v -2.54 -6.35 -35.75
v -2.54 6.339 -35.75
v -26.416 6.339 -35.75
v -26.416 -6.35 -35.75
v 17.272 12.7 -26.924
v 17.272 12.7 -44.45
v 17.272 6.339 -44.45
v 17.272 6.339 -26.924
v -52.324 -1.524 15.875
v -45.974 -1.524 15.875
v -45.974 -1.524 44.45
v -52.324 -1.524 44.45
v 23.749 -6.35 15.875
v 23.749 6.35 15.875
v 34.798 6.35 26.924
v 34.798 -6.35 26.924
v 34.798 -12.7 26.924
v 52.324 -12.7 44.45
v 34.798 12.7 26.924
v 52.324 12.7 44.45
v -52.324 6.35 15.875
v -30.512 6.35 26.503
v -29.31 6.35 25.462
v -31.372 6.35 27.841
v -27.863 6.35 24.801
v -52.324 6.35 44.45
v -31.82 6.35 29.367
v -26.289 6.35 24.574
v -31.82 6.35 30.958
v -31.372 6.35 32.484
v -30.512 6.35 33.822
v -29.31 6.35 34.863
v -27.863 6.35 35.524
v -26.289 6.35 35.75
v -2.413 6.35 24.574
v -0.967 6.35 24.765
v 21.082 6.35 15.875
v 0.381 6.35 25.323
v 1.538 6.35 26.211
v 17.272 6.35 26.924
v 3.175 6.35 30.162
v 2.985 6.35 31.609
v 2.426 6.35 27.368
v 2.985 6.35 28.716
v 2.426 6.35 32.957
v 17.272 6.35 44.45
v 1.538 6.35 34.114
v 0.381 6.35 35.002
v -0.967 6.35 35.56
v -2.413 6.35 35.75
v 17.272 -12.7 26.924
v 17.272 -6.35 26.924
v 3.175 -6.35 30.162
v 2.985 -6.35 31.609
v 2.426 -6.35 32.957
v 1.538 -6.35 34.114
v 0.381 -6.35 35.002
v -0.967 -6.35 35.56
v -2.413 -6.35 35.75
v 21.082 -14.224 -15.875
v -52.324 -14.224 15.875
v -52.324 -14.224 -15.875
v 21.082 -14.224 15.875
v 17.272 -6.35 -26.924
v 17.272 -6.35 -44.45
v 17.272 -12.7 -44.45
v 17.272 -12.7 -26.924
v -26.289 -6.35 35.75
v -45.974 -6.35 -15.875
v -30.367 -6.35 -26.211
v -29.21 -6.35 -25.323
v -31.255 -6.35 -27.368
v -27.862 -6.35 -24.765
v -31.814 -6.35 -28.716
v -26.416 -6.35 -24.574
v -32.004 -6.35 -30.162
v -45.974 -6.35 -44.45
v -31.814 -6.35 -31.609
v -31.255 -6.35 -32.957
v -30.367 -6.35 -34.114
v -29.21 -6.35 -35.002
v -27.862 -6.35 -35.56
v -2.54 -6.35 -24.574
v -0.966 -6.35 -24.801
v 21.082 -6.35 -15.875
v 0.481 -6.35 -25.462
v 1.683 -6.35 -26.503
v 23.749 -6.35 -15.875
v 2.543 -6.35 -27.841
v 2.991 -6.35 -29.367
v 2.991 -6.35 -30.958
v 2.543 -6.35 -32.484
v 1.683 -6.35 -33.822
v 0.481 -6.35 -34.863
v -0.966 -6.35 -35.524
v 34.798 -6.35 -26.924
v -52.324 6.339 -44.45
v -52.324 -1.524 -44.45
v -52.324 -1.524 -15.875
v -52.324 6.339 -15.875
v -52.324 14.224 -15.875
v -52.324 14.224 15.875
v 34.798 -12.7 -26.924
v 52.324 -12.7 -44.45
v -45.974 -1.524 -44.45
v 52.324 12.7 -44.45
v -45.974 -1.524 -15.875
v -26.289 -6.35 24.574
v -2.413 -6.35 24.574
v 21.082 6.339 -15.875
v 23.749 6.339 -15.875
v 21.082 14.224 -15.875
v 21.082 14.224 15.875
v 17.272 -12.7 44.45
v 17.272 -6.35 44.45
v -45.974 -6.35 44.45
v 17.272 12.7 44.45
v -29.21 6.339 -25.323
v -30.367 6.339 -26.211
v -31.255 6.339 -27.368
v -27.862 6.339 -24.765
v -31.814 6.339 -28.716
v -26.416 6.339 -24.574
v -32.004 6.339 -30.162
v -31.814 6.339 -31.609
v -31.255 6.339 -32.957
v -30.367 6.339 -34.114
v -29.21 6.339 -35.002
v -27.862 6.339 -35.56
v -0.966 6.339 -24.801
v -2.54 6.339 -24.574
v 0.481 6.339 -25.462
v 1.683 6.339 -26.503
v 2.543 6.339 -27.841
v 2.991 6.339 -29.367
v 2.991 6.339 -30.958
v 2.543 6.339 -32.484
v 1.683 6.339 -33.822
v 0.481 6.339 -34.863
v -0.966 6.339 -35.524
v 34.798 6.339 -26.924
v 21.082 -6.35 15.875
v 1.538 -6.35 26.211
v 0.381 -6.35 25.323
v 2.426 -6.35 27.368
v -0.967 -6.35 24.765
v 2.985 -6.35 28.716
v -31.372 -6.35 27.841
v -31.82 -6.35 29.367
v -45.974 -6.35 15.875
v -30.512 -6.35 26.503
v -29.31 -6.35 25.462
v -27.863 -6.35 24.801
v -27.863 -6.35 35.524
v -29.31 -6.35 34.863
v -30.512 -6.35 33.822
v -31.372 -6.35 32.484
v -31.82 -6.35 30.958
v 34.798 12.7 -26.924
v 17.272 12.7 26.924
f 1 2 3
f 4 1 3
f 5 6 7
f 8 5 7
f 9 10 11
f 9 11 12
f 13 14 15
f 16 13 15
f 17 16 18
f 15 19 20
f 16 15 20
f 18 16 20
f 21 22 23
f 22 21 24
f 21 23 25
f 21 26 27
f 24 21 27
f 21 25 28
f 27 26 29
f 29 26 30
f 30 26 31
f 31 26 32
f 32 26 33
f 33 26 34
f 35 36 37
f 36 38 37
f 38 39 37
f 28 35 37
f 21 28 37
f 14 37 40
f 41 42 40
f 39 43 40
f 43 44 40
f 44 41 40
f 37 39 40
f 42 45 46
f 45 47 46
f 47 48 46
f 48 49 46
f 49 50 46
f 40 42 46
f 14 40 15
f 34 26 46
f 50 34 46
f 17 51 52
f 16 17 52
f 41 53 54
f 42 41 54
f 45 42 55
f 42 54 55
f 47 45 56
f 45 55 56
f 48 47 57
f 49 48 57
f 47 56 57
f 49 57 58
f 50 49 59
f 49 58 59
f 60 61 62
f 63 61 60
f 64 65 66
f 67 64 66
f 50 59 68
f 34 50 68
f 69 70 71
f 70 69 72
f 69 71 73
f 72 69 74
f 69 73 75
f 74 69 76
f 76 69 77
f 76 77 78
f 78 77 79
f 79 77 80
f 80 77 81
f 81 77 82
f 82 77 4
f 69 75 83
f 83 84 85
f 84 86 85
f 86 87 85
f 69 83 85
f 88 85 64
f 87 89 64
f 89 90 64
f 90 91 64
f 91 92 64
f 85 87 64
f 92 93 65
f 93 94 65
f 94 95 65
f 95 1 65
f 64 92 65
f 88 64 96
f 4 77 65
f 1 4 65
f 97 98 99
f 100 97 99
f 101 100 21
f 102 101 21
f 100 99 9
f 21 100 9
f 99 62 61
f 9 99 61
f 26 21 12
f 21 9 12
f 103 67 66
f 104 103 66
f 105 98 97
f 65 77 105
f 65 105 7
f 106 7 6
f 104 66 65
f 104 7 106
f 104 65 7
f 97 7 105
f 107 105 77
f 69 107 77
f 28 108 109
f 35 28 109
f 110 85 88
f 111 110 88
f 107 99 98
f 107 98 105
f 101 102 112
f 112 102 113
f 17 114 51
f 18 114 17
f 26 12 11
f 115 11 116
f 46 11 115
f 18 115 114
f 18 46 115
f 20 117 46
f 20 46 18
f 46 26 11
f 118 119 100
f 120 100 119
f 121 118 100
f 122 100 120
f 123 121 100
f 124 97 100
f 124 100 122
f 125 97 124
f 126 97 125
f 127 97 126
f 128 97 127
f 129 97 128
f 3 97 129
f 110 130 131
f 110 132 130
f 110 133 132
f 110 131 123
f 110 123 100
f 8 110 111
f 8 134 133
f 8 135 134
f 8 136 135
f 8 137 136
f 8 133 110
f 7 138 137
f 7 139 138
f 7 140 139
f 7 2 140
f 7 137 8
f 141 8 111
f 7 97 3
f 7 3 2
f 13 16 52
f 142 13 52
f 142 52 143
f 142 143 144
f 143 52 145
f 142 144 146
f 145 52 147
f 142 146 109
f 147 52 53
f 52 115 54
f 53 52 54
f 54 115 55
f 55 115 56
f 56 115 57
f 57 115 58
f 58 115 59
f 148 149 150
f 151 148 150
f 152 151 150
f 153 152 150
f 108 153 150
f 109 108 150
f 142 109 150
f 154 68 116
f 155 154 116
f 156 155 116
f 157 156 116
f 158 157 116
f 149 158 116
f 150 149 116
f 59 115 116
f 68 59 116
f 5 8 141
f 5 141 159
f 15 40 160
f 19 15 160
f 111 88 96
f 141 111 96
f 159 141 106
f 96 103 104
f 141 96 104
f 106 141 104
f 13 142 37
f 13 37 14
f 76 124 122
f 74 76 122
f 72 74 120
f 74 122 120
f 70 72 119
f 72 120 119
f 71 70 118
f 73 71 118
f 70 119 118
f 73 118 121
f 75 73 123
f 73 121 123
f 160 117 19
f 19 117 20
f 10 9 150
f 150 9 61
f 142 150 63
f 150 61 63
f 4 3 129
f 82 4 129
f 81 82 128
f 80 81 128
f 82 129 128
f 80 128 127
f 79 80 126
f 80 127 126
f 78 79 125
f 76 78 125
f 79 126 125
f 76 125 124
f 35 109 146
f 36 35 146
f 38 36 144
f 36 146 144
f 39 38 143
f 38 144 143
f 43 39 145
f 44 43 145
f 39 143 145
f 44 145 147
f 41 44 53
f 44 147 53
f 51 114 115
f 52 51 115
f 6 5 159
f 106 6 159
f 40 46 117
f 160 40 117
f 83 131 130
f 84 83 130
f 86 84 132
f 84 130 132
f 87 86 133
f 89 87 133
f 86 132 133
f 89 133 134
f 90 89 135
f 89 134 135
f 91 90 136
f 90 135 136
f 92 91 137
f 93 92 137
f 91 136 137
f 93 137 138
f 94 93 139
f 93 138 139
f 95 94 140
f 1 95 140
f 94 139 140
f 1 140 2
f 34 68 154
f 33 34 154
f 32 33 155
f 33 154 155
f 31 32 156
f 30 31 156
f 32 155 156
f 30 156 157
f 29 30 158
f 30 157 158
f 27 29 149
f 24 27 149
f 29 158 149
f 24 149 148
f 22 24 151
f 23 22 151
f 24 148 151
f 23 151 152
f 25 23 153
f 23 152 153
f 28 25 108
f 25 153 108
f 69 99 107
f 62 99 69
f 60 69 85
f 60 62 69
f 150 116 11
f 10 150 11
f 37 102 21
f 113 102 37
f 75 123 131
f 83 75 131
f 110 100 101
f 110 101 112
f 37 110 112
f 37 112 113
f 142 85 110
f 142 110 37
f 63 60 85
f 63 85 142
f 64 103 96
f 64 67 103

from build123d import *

# Parameters (mm, degrees)
F0_W      = 104.648
F0_H      = 31.75
F1_DEPTH  = 14.224
F0_H_2    = 28.575
F2_DEPTH  = 12.7
F4_W      = 69.596
F4_H      = 6.3613896862
F5_DEPTH  = 28.575
F3_W      = 69.596
F3_H      = 6.35
F6_DEPTH  = 28.575
F7_W      = 6.35
F7_H      = 11.049
F7_W_2    = 6.3613896862
F8_DEPTH  = 52.325
F9_W      = 31.242
F9_H      = 31.75
F10_DEPTH = 28.449
F12_DEPTH = 20.575
F14_DEPTH = 26.925
F16_DEPTH = 26.925
F18_DEPTH = 20.575
F21_DEPTH = 20.575
F22_DEPTH = 20.5636103138


with BuildPart() as f1:
    # F0 (on Front) → F1 (new body, symmetric)
    with BuildSketch(Plane.XZ):
        Rectangle(F0_W, F0_H)
    extrude(amount=F1_DEPTH, both=True)

    # F0 (on Front) → F2 (join, symmetric)
    with BuildSketch(Plane.XZ):
        with Locations((0, 30.1625)):
            Rectangle(F0_W, F0_H_2)
        with Locations((0, -30.1625)):
            Rectangle(F0_W, F0_H_2)
    extrude(amount=F2_DEPTH, both=True)

    # F4 (on face) → F5 (cut)
    with BuildSketch(Plane(origin=(0, 0, -44.45), x_dir=(1, 0, 0), z_dir=(0, 0, -1))):
        Polygon((17.272, 6.35), (17.272, 12.7), (-52.324, 12.7), (-52.324, 1.524), (-45.974, 1.524), (-45.974, 6.35), align=None)
        with Locations((-17.526, -9.5193051569)):
            Rectangle(F4_W, F4_H)
    extrude(amount=-F5_DEPTH, mode=Mode.SUBTRACT)

    # F3 (on face) → F6 (cut)
    with BuildSketch(Plane.XY.offset(44.45)):
        with Locations((-17.526, 9.525)):
            Rectangle(F3_W, F3_H)
        Polygon((-45.974, -1.524), (-52.324, -1.524), (-52.324, -12.7), (17.272, -12.7), (17.272, -6.35), (-45.974, -6.35), align=None)
    extrude(amount=-F6_DEPTH, mode=Mode.SUBTRACT)

    # F7 (on Right) → F8 (cut, through all)
    with BuildSketch(Plane.YZ):
        with Locations((-9.525, 21.3995)):
            Rectangle(F7_W, F7_H)
        with Locations((9.525, 21.3995)):
            Rectangle(F7_W, F7_H)
        with Locations((9.5193051569, -21.3995)):
            Rectangle(F7_W_2, F7_H)
        with Locations((-9.525, -21.3995)):
            Rectangle(F7_W, F7_H)
    extrude(amount=F8_DEPTH, mode=Mode.SUBTRACT)

    # F9 (on face) → F10 (cut, through all)
    with BuildSketch(Plane.XZ.offset(14.224)):
        with Locations((36.703, 0)):
            Rectangle(F9_W, F9_H)
    extrude(amount=-F10_DEPTH, mode=Mode.SUBTRACT)

    # F11 (on face) → F12 (cut, through all)
    with BuildSketch(Plane.XZ.offset(6.35)):
        Polygon((23.749, -15.875), (34.798, -26.924), (52.324, -26.924), (52.324, -15.875), align=None)
    extrude(amount=-F12_DEPTH, mode=Mode.SUBTRACT)

    # F13 (on face) → F14 (cut, through all)
    with BuildSketch(Plane.XZ.offset(12.7)):
        Polygon((34.798, -26.924), (52.324, -44.45), (52.324, -26.924), align=None)
    extrude(amount=-F14_DEPTH, mode=Mode.SUBTRACT)

    # F15 (on face) → F16 (cut, through all)
    with BuildSketch(Plane(origin=(0, 12.7, 0), x_dir=(-1, 0, 0), z_dir=(0, 1, 0))):
        Polygon((-34.798, 26.924), (-52.324, 44.45), (-52.324, 26.924), align=None)
    extrude(amount=-F16_DEPTH, mode=Mode.SUBTRACT)

    # F17 (on face) → F18 (cut, through all)
    with BuildSketch(Plane(origin=(0, 6.35, 0), x_dir=(-1, 0, 0), z_dir=(0, 1, 0))):
        Polygon((-23.749, 15.875), (-34.798, 26.924), (-52.324, 26.924), (-52.324, 15.875), align=None)
    extrude(amount=-F18_DEPTH, mode=Mode.SUBTRACT)

    # F20 (on face) → F21 (cut, through all)
    with BuildSketch(Plane.XZ.offset(6.35)):
        with BuildLine():
            ThreePointArc((-26.289, 24.5745), (-22.3376873067, 26.2111873067), (-20.701, 30.1625))
            ThreePointArc((-20.701, 30.1625), (-22.3376873067, 34.1138126933), (-26.289, 35.7505))
            ThreePointArc((-26.289, 35.7505), (-31.877, 30.1625), (-26.289, 24.5745))
        make_face()
        with BuildLine():
            ThreePointArc((-26.289, 35.7505), (-22.3376873067, 34.1138126933), (-20.701, 30.1625))
            ThreePointArc((-20.701, 30.1625), (-22.3376873067, 26.2111873067), (-26.289, 24.5745))
            Line((-26.289, 24.5745), (-2.413, 24.5745))
            ThreePointArc((-2.413, 24.5745), (-8.001, 30.1625), (-2.413, 35.7505))
            Line((-2.413, 35.7505), (-26.289, 35.7505))
        make_face()
        with BuildLine():
            ThreePointArc((3.175, 30.1625), (1.5383126933, 34.1138126933), (-2.413, 35.7505))
            ThreePointArc((-2.413, 35.7505), (-8.001, 30.1625), (-2.413, 24.5745))
            ThreePointArc((-2.413, 24.5745), (1.5383126933, 26.2111873067), (3.175, 30.1625))
        make_face()
    extrude(amount=-F21_DEPTH, mode=Mode.SUBTRACT)

    # F19 (on face) → F22 (cut, through all)
    with BuildSketch(Plane(origin=(0, 6.3386103138, 0), x_dir=(-1, 0, 0), z_dir=(0, 1, 0))):
        with BuildLine():
            ThreePointArc((26.416, -35.7505), (30.3673126933, -34.1138126933), (32.004, -30.1625))
            ThreePointArc((32.004, -30.1625), (30.3673126933, -26.2111873067), (26.416, -24.5745))
            ThreePointArc((26.416, -24.5745), (20.828, -30.1625), (26.416, -35.7505))
        make_face()
        with BuildLine():
            ThreePointArc((26.416, -35.7505), (20.828, -30.1625), (26.416, -24.5745))
            Line((26.416, -24.5745), (2.54, -24.5745))
            ThreePointArc((2.54, -24.5745), (6.4913126933, -26.2111873067), (8.128, -30.1625))
            ThreePointArc((8.128, -30.1625), (6.4913126933, -34.1138126933), (2.54, -35.7505))
            Line((2.54, -35.7505), (26.416, -35.7505))
        make_face()
        with BuildLine():
            ThreePointArc((8.128, -30.1625), (6.4913126933, -26.2111873067), (2.54, -24.5745))
            ThreePointArc((2.54, -24.5745), (-3.048, -30.1625), (2.54, -35.7505))
            ThreePointArc((2.54, -35.7505), (6.4913126933, -34.1138126933), (8.128, -30.1625))
        make_face()
    extrude(amount=-F22_DEPTH, mode=Mode.SUBTRACT)


solid = f1.part
